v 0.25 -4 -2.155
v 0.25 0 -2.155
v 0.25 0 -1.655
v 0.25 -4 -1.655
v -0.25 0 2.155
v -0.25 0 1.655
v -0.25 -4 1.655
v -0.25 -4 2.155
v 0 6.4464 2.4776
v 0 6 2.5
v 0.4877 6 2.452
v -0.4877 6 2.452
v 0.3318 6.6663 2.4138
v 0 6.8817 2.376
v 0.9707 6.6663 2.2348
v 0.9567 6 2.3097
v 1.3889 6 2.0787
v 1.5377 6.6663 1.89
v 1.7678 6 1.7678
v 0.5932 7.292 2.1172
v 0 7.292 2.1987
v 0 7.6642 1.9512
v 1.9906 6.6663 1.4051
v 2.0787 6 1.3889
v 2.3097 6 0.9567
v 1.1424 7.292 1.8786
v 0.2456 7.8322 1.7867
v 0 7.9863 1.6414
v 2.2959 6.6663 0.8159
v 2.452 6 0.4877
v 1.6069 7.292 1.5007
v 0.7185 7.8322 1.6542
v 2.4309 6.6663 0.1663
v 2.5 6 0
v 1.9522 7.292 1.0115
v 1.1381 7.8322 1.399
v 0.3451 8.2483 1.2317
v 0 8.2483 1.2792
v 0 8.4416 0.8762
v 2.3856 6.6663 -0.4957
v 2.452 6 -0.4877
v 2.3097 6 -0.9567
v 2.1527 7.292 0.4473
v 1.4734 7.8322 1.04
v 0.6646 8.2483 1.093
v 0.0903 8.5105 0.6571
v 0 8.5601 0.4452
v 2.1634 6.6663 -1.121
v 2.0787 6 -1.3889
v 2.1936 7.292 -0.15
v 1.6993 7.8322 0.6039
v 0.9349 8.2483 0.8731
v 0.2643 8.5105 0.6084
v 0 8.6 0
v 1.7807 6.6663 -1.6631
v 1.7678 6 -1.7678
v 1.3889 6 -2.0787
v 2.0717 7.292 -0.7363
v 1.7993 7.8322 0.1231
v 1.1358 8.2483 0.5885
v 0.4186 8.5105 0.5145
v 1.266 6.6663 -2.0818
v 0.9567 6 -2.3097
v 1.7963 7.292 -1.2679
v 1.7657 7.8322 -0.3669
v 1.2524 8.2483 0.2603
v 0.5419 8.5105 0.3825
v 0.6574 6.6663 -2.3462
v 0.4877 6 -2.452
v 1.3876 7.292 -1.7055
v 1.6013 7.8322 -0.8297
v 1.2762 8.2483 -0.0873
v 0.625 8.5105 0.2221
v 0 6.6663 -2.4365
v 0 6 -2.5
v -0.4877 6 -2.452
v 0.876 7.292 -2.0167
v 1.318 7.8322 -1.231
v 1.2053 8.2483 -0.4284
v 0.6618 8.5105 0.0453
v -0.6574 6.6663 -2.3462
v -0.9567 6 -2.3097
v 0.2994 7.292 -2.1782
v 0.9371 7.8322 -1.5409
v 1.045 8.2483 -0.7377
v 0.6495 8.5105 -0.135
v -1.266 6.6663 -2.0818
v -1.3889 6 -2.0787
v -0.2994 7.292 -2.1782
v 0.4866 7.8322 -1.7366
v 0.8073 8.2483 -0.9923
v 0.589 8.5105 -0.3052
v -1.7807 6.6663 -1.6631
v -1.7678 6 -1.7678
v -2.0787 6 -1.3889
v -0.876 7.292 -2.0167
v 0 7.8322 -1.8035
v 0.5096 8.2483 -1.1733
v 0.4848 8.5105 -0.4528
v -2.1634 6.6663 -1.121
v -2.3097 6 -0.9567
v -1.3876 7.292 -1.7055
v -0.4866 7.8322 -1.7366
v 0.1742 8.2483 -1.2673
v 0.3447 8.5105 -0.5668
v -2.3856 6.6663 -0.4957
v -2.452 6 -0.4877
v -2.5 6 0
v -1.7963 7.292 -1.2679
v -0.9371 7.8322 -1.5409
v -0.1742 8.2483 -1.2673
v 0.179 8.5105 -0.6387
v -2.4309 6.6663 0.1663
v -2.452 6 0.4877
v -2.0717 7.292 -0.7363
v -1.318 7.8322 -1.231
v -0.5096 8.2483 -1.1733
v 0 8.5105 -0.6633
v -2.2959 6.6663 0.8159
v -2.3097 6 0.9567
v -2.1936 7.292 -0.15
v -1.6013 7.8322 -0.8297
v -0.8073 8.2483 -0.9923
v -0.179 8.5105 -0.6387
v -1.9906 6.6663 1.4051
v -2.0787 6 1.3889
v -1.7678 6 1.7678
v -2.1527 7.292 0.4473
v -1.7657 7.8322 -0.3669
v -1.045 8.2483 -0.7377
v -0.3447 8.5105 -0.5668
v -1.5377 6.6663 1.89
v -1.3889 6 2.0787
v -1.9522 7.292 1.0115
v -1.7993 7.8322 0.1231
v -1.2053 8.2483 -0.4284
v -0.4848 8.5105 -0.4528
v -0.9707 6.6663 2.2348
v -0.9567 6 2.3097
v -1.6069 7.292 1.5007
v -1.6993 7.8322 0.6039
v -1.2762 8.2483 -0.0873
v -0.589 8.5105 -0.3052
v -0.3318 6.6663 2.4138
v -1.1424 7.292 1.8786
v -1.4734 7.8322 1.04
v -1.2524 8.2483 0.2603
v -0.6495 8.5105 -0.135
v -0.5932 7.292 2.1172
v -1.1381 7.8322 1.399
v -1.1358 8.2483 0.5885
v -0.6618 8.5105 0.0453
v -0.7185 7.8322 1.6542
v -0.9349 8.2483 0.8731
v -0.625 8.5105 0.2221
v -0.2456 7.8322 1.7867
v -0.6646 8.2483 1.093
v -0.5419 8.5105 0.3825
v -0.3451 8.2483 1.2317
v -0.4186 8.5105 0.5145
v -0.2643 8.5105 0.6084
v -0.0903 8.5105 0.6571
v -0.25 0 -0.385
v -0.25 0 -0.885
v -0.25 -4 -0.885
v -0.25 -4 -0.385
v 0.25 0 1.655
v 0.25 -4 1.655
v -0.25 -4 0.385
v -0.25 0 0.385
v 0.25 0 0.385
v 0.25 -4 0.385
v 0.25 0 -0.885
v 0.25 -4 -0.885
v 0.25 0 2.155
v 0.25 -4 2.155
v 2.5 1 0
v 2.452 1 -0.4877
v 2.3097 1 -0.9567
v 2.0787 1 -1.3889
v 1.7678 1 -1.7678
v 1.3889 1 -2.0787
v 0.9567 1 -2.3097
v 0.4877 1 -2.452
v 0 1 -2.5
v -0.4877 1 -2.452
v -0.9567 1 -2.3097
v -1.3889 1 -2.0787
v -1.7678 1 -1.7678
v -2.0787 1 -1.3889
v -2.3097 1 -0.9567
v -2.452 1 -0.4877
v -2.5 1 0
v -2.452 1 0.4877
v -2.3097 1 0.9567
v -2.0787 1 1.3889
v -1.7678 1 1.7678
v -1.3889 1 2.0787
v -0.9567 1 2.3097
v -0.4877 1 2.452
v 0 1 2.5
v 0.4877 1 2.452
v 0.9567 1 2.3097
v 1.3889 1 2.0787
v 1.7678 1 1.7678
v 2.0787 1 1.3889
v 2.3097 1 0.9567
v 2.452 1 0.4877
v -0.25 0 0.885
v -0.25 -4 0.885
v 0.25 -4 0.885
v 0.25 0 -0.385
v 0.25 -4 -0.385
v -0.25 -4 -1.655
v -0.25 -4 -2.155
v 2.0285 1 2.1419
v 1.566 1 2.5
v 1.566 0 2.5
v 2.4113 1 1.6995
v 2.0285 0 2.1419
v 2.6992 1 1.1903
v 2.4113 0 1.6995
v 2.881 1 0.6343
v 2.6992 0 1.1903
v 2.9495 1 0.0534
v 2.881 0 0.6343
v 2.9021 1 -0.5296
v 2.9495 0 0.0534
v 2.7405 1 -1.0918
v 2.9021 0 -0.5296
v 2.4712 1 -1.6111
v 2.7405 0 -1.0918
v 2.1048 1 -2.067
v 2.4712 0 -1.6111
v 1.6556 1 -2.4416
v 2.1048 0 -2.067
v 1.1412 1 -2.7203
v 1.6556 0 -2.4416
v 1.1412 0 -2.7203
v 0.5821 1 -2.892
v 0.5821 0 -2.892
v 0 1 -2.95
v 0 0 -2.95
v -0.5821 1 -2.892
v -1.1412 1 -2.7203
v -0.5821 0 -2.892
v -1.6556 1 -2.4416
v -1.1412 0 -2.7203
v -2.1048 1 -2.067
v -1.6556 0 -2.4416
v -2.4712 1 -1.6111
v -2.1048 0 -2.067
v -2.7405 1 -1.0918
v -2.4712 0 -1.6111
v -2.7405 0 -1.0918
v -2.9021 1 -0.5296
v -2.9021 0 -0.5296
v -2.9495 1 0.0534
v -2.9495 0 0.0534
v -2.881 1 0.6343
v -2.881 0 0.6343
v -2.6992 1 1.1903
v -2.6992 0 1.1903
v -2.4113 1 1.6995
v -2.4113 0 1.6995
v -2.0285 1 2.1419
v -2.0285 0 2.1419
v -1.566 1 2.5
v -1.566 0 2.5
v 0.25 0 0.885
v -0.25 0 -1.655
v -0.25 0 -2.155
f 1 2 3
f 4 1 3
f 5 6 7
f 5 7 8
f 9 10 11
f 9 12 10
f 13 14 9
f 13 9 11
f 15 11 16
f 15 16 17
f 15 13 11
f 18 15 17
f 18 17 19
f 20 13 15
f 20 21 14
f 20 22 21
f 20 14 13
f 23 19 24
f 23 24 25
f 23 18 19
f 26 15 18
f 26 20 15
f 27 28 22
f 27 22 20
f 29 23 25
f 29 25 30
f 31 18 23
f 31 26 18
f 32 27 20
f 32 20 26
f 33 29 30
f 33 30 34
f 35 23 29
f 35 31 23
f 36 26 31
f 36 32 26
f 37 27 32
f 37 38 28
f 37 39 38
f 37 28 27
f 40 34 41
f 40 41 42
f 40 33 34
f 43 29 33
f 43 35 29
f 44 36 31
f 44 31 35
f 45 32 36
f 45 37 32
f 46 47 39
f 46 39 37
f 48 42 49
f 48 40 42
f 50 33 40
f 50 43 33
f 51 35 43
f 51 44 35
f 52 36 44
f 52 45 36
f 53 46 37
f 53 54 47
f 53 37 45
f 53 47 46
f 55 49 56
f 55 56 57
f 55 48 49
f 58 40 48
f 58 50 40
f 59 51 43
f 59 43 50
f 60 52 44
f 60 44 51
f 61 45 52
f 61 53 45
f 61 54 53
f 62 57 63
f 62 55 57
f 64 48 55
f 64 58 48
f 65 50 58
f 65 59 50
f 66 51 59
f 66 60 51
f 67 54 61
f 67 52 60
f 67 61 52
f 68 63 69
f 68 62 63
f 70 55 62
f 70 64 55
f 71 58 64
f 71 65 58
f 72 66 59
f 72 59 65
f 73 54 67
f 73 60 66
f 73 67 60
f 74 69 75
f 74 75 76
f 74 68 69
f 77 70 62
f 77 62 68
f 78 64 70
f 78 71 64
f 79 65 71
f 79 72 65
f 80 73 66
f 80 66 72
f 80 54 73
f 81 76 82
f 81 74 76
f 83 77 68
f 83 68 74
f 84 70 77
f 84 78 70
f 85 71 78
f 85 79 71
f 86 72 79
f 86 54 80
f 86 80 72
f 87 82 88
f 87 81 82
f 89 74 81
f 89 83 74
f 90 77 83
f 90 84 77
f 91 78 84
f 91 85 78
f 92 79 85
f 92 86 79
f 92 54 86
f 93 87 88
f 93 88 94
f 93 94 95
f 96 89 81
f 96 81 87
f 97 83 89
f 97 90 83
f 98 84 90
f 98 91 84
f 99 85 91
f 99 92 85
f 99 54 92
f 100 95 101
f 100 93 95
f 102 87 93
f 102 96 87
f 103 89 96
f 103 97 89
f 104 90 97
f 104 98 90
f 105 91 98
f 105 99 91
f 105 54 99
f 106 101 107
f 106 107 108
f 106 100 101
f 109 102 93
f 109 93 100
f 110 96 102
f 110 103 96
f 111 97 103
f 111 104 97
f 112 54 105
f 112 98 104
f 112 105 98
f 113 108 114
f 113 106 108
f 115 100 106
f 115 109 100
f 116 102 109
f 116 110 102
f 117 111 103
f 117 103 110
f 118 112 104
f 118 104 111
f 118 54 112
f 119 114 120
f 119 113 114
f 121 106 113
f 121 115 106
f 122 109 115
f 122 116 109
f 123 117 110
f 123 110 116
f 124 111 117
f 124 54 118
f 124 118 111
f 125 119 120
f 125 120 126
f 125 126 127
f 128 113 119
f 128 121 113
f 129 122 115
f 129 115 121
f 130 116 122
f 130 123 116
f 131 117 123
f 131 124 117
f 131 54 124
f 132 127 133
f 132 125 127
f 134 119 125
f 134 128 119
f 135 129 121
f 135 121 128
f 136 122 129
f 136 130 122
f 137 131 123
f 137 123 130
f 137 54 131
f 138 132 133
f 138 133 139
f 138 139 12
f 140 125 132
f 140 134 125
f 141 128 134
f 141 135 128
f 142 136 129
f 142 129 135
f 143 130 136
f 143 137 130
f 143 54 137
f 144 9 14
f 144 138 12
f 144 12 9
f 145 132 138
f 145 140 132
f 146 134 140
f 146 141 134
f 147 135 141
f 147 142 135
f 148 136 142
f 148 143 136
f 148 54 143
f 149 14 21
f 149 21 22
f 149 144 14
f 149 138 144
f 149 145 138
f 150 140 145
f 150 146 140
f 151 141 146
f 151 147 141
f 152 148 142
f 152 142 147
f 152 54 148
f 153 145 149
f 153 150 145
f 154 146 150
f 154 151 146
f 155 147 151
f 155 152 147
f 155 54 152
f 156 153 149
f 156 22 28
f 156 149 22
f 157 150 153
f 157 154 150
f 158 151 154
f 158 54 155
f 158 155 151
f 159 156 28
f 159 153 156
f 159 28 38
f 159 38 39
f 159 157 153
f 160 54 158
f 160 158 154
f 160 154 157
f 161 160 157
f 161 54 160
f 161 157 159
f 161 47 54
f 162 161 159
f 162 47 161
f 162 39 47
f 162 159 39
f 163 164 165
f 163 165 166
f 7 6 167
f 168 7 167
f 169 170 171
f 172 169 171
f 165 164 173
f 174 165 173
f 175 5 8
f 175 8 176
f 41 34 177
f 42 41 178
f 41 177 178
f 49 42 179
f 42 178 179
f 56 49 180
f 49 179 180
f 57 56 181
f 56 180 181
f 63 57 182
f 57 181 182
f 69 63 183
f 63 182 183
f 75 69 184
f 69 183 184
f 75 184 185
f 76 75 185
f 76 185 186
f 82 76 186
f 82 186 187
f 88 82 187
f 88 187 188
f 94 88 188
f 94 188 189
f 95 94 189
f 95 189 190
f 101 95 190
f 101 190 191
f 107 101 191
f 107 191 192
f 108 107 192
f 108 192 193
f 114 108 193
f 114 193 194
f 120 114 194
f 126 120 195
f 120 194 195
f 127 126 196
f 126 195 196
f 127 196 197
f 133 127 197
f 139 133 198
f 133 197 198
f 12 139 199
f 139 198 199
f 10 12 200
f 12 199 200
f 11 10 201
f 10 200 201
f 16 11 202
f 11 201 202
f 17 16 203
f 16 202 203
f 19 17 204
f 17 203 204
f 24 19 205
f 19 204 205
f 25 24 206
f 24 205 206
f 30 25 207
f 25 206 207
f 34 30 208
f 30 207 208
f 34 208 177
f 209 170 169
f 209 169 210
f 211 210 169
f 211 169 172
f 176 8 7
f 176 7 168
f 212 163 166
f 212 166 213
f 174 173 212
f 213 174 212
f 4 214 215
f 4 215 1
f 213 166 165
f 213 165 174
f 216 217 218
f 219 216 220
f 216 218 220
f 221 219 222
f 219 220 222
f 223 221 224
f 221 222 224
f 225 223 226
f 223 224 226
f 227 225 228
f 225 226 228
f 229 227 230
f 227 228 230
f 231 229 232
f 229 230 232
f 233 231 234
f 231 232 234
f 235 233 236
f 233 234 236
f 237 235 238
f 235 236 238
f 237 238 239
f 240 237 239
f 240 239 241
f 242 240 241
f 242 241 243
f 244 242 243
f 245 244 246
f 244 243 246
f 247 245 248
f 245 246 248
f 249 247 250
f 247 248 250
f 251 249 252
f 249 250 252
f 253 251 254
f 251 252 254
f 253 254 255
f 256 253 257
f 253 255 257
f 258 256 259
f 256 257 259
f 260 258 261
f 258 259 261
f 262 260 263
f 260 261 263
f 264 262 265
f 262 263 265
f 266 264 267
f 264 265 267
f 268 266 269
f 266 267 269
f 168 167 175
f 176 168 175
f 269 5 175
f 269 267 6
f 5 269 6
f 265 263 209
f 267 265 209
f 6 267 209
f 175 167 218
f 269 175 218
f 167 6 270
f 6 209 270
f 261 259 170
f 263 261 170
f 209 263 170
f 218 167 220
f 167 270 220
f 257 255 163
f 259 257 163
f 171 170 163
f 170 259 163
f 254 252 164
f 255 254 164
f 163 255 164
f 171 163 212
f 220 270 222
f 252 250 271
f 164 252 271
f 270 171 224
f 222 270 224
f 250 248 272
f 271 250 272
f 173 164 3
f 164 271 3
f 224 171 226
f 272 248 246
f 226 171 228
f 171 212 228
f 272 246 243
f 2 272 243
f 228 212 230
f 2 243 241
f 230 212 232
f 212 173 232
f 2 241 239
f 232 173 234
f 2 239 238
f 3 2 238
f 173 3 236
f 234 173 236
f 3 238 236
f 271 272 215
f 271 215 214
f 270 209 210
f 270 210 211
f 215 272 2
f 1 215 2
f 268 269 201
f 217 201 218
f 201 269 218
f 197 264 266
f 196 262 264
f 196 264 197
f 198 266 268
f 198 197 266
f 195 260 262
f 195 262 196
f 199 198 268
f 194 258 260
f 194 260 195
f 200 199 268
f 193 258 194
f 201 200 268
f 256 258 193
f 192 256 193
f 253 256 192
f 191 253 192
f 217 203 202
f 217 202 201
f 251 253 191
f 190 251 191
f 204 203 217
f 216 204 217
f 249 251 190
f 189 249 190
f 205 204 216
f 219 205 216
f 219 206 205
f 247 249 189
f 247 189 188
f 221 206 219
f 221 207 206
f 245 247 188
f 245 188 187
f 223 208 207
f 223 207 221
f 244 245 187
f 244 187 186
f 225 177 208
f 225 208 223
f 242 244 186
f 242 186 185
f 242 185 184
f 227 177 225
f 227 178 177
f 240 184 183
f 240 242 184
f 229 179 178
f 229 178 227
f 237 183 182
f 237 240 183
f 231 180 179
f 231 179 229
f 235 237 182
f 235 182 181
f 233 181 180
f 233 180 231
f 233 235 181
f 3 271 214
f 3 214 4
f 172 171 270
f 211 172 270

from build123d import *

# Parameters (mm, degrees)
SKETCH1_R           = 2.5
BOSS_EXTRUDE1_DEPTH = 6
SKETCH2_R           = 2.95
BOSS_EXTRUDE2_DEPTH = 1
DOME1_FACE_RADIUS   = 2.5
DOME1_HEIGHT        = 2.6
CUT_EXTRUDE1_REACH  = 10.6
SKETCH3_W           = 4.756042082
SKETCH3_H           = 0.515985698
SKETCH4_W           = 0.5
SKETCH4_H           = 0.5
BOSS_EXTRUDE3_DEPTH = 4


with BuildPart() as part:
    # Sketch1 → Boss-Extrude1 (new body)
    with BuildSketch(Plane(origin=(0, 0, 0), x_dir=(1, 0, 0), z_dir=(0, 1, 0))):
        Circle(SKETCH1_R)
    extrude(amount=BOSS_EXTRUDE1_DEPTH)

    # Sketch2 → Boss-Extrude2 (add)
    with BuildSketch(Plane(origin=(0, 0, 0), x_dir=(1, 0, 0), z_dir=(0, 1, 0))):
        Circle(SKETCH2_R)
    extrude(amount=BOSS_EXTRUDE2_DEPTH)

    # Dome1: a dome of height H over a round flat face of radius A is a cap of a sphere of radius (A * A + H * H) / (2 * H)
    dome1_r = (DOME1_FACE_RADIUS * DOME1_FACE_RADIUS + DOME1_HEIGHT * DOME1_HEIGHT) / (2 * DOME1_HEIGHT)
    dome1_base = Plane((0, 6, 0), z_dir=(0, 1, 0))
    with Locations(dome1_base.offset(DOME1_HEIGHT - dome1_r)):
        dome1_ball = Sphere(dome1_r, mode=Mode.PRIVATE)
    add(split(dome1_ball, bisect_by=dome1_base, keep=Keep.TOP, mode=Mode.PRIVATE))

    # Sketch3 → Cut-Extrude1 (cut, up to next)
    with BuildSketch(Plane.XZ, mode=Mode.PRIVATE) as cut_extrude1_sk1:
        with Locations((0.213124527, 2.757992849)):
            Rectangle(SKETCH3_W, SKETCH3_H)
    cut_extrude1_tool1 = extrude(cut_extrude1_sk1.sketch, amount=-CUT_EXTRUDE1_REACH, mode=Mode.PRIVATE) & part.part
    add(cut_extrude1_tool1.solids().sort_by_distance((0.213125, 0, 2.757993))[0], mode=Mode.SUBTRACT)

    # Sketch4 → Boss-Extrude3 (add)
    with BuildSketch(Plane.XZ):
        with Locations((0, 1.905)):
            Rectangle(SKETCH4_W, SKETCH4_H)
        with Locations((0, 0.635)):
            Rectangle(SKETCH4_W, SKETCH4_H)
        with Locations((0, -0.635)):
            Rectangle(SKETCH4_W, SKETCH4_H)
        with Locations((0, -1.905)):
            Rectangle(SKETCH4_W, SKETCH4_H)
    extrude(amount=BOSS_EXTRUDE3_DEPTH)


solid = part.part
